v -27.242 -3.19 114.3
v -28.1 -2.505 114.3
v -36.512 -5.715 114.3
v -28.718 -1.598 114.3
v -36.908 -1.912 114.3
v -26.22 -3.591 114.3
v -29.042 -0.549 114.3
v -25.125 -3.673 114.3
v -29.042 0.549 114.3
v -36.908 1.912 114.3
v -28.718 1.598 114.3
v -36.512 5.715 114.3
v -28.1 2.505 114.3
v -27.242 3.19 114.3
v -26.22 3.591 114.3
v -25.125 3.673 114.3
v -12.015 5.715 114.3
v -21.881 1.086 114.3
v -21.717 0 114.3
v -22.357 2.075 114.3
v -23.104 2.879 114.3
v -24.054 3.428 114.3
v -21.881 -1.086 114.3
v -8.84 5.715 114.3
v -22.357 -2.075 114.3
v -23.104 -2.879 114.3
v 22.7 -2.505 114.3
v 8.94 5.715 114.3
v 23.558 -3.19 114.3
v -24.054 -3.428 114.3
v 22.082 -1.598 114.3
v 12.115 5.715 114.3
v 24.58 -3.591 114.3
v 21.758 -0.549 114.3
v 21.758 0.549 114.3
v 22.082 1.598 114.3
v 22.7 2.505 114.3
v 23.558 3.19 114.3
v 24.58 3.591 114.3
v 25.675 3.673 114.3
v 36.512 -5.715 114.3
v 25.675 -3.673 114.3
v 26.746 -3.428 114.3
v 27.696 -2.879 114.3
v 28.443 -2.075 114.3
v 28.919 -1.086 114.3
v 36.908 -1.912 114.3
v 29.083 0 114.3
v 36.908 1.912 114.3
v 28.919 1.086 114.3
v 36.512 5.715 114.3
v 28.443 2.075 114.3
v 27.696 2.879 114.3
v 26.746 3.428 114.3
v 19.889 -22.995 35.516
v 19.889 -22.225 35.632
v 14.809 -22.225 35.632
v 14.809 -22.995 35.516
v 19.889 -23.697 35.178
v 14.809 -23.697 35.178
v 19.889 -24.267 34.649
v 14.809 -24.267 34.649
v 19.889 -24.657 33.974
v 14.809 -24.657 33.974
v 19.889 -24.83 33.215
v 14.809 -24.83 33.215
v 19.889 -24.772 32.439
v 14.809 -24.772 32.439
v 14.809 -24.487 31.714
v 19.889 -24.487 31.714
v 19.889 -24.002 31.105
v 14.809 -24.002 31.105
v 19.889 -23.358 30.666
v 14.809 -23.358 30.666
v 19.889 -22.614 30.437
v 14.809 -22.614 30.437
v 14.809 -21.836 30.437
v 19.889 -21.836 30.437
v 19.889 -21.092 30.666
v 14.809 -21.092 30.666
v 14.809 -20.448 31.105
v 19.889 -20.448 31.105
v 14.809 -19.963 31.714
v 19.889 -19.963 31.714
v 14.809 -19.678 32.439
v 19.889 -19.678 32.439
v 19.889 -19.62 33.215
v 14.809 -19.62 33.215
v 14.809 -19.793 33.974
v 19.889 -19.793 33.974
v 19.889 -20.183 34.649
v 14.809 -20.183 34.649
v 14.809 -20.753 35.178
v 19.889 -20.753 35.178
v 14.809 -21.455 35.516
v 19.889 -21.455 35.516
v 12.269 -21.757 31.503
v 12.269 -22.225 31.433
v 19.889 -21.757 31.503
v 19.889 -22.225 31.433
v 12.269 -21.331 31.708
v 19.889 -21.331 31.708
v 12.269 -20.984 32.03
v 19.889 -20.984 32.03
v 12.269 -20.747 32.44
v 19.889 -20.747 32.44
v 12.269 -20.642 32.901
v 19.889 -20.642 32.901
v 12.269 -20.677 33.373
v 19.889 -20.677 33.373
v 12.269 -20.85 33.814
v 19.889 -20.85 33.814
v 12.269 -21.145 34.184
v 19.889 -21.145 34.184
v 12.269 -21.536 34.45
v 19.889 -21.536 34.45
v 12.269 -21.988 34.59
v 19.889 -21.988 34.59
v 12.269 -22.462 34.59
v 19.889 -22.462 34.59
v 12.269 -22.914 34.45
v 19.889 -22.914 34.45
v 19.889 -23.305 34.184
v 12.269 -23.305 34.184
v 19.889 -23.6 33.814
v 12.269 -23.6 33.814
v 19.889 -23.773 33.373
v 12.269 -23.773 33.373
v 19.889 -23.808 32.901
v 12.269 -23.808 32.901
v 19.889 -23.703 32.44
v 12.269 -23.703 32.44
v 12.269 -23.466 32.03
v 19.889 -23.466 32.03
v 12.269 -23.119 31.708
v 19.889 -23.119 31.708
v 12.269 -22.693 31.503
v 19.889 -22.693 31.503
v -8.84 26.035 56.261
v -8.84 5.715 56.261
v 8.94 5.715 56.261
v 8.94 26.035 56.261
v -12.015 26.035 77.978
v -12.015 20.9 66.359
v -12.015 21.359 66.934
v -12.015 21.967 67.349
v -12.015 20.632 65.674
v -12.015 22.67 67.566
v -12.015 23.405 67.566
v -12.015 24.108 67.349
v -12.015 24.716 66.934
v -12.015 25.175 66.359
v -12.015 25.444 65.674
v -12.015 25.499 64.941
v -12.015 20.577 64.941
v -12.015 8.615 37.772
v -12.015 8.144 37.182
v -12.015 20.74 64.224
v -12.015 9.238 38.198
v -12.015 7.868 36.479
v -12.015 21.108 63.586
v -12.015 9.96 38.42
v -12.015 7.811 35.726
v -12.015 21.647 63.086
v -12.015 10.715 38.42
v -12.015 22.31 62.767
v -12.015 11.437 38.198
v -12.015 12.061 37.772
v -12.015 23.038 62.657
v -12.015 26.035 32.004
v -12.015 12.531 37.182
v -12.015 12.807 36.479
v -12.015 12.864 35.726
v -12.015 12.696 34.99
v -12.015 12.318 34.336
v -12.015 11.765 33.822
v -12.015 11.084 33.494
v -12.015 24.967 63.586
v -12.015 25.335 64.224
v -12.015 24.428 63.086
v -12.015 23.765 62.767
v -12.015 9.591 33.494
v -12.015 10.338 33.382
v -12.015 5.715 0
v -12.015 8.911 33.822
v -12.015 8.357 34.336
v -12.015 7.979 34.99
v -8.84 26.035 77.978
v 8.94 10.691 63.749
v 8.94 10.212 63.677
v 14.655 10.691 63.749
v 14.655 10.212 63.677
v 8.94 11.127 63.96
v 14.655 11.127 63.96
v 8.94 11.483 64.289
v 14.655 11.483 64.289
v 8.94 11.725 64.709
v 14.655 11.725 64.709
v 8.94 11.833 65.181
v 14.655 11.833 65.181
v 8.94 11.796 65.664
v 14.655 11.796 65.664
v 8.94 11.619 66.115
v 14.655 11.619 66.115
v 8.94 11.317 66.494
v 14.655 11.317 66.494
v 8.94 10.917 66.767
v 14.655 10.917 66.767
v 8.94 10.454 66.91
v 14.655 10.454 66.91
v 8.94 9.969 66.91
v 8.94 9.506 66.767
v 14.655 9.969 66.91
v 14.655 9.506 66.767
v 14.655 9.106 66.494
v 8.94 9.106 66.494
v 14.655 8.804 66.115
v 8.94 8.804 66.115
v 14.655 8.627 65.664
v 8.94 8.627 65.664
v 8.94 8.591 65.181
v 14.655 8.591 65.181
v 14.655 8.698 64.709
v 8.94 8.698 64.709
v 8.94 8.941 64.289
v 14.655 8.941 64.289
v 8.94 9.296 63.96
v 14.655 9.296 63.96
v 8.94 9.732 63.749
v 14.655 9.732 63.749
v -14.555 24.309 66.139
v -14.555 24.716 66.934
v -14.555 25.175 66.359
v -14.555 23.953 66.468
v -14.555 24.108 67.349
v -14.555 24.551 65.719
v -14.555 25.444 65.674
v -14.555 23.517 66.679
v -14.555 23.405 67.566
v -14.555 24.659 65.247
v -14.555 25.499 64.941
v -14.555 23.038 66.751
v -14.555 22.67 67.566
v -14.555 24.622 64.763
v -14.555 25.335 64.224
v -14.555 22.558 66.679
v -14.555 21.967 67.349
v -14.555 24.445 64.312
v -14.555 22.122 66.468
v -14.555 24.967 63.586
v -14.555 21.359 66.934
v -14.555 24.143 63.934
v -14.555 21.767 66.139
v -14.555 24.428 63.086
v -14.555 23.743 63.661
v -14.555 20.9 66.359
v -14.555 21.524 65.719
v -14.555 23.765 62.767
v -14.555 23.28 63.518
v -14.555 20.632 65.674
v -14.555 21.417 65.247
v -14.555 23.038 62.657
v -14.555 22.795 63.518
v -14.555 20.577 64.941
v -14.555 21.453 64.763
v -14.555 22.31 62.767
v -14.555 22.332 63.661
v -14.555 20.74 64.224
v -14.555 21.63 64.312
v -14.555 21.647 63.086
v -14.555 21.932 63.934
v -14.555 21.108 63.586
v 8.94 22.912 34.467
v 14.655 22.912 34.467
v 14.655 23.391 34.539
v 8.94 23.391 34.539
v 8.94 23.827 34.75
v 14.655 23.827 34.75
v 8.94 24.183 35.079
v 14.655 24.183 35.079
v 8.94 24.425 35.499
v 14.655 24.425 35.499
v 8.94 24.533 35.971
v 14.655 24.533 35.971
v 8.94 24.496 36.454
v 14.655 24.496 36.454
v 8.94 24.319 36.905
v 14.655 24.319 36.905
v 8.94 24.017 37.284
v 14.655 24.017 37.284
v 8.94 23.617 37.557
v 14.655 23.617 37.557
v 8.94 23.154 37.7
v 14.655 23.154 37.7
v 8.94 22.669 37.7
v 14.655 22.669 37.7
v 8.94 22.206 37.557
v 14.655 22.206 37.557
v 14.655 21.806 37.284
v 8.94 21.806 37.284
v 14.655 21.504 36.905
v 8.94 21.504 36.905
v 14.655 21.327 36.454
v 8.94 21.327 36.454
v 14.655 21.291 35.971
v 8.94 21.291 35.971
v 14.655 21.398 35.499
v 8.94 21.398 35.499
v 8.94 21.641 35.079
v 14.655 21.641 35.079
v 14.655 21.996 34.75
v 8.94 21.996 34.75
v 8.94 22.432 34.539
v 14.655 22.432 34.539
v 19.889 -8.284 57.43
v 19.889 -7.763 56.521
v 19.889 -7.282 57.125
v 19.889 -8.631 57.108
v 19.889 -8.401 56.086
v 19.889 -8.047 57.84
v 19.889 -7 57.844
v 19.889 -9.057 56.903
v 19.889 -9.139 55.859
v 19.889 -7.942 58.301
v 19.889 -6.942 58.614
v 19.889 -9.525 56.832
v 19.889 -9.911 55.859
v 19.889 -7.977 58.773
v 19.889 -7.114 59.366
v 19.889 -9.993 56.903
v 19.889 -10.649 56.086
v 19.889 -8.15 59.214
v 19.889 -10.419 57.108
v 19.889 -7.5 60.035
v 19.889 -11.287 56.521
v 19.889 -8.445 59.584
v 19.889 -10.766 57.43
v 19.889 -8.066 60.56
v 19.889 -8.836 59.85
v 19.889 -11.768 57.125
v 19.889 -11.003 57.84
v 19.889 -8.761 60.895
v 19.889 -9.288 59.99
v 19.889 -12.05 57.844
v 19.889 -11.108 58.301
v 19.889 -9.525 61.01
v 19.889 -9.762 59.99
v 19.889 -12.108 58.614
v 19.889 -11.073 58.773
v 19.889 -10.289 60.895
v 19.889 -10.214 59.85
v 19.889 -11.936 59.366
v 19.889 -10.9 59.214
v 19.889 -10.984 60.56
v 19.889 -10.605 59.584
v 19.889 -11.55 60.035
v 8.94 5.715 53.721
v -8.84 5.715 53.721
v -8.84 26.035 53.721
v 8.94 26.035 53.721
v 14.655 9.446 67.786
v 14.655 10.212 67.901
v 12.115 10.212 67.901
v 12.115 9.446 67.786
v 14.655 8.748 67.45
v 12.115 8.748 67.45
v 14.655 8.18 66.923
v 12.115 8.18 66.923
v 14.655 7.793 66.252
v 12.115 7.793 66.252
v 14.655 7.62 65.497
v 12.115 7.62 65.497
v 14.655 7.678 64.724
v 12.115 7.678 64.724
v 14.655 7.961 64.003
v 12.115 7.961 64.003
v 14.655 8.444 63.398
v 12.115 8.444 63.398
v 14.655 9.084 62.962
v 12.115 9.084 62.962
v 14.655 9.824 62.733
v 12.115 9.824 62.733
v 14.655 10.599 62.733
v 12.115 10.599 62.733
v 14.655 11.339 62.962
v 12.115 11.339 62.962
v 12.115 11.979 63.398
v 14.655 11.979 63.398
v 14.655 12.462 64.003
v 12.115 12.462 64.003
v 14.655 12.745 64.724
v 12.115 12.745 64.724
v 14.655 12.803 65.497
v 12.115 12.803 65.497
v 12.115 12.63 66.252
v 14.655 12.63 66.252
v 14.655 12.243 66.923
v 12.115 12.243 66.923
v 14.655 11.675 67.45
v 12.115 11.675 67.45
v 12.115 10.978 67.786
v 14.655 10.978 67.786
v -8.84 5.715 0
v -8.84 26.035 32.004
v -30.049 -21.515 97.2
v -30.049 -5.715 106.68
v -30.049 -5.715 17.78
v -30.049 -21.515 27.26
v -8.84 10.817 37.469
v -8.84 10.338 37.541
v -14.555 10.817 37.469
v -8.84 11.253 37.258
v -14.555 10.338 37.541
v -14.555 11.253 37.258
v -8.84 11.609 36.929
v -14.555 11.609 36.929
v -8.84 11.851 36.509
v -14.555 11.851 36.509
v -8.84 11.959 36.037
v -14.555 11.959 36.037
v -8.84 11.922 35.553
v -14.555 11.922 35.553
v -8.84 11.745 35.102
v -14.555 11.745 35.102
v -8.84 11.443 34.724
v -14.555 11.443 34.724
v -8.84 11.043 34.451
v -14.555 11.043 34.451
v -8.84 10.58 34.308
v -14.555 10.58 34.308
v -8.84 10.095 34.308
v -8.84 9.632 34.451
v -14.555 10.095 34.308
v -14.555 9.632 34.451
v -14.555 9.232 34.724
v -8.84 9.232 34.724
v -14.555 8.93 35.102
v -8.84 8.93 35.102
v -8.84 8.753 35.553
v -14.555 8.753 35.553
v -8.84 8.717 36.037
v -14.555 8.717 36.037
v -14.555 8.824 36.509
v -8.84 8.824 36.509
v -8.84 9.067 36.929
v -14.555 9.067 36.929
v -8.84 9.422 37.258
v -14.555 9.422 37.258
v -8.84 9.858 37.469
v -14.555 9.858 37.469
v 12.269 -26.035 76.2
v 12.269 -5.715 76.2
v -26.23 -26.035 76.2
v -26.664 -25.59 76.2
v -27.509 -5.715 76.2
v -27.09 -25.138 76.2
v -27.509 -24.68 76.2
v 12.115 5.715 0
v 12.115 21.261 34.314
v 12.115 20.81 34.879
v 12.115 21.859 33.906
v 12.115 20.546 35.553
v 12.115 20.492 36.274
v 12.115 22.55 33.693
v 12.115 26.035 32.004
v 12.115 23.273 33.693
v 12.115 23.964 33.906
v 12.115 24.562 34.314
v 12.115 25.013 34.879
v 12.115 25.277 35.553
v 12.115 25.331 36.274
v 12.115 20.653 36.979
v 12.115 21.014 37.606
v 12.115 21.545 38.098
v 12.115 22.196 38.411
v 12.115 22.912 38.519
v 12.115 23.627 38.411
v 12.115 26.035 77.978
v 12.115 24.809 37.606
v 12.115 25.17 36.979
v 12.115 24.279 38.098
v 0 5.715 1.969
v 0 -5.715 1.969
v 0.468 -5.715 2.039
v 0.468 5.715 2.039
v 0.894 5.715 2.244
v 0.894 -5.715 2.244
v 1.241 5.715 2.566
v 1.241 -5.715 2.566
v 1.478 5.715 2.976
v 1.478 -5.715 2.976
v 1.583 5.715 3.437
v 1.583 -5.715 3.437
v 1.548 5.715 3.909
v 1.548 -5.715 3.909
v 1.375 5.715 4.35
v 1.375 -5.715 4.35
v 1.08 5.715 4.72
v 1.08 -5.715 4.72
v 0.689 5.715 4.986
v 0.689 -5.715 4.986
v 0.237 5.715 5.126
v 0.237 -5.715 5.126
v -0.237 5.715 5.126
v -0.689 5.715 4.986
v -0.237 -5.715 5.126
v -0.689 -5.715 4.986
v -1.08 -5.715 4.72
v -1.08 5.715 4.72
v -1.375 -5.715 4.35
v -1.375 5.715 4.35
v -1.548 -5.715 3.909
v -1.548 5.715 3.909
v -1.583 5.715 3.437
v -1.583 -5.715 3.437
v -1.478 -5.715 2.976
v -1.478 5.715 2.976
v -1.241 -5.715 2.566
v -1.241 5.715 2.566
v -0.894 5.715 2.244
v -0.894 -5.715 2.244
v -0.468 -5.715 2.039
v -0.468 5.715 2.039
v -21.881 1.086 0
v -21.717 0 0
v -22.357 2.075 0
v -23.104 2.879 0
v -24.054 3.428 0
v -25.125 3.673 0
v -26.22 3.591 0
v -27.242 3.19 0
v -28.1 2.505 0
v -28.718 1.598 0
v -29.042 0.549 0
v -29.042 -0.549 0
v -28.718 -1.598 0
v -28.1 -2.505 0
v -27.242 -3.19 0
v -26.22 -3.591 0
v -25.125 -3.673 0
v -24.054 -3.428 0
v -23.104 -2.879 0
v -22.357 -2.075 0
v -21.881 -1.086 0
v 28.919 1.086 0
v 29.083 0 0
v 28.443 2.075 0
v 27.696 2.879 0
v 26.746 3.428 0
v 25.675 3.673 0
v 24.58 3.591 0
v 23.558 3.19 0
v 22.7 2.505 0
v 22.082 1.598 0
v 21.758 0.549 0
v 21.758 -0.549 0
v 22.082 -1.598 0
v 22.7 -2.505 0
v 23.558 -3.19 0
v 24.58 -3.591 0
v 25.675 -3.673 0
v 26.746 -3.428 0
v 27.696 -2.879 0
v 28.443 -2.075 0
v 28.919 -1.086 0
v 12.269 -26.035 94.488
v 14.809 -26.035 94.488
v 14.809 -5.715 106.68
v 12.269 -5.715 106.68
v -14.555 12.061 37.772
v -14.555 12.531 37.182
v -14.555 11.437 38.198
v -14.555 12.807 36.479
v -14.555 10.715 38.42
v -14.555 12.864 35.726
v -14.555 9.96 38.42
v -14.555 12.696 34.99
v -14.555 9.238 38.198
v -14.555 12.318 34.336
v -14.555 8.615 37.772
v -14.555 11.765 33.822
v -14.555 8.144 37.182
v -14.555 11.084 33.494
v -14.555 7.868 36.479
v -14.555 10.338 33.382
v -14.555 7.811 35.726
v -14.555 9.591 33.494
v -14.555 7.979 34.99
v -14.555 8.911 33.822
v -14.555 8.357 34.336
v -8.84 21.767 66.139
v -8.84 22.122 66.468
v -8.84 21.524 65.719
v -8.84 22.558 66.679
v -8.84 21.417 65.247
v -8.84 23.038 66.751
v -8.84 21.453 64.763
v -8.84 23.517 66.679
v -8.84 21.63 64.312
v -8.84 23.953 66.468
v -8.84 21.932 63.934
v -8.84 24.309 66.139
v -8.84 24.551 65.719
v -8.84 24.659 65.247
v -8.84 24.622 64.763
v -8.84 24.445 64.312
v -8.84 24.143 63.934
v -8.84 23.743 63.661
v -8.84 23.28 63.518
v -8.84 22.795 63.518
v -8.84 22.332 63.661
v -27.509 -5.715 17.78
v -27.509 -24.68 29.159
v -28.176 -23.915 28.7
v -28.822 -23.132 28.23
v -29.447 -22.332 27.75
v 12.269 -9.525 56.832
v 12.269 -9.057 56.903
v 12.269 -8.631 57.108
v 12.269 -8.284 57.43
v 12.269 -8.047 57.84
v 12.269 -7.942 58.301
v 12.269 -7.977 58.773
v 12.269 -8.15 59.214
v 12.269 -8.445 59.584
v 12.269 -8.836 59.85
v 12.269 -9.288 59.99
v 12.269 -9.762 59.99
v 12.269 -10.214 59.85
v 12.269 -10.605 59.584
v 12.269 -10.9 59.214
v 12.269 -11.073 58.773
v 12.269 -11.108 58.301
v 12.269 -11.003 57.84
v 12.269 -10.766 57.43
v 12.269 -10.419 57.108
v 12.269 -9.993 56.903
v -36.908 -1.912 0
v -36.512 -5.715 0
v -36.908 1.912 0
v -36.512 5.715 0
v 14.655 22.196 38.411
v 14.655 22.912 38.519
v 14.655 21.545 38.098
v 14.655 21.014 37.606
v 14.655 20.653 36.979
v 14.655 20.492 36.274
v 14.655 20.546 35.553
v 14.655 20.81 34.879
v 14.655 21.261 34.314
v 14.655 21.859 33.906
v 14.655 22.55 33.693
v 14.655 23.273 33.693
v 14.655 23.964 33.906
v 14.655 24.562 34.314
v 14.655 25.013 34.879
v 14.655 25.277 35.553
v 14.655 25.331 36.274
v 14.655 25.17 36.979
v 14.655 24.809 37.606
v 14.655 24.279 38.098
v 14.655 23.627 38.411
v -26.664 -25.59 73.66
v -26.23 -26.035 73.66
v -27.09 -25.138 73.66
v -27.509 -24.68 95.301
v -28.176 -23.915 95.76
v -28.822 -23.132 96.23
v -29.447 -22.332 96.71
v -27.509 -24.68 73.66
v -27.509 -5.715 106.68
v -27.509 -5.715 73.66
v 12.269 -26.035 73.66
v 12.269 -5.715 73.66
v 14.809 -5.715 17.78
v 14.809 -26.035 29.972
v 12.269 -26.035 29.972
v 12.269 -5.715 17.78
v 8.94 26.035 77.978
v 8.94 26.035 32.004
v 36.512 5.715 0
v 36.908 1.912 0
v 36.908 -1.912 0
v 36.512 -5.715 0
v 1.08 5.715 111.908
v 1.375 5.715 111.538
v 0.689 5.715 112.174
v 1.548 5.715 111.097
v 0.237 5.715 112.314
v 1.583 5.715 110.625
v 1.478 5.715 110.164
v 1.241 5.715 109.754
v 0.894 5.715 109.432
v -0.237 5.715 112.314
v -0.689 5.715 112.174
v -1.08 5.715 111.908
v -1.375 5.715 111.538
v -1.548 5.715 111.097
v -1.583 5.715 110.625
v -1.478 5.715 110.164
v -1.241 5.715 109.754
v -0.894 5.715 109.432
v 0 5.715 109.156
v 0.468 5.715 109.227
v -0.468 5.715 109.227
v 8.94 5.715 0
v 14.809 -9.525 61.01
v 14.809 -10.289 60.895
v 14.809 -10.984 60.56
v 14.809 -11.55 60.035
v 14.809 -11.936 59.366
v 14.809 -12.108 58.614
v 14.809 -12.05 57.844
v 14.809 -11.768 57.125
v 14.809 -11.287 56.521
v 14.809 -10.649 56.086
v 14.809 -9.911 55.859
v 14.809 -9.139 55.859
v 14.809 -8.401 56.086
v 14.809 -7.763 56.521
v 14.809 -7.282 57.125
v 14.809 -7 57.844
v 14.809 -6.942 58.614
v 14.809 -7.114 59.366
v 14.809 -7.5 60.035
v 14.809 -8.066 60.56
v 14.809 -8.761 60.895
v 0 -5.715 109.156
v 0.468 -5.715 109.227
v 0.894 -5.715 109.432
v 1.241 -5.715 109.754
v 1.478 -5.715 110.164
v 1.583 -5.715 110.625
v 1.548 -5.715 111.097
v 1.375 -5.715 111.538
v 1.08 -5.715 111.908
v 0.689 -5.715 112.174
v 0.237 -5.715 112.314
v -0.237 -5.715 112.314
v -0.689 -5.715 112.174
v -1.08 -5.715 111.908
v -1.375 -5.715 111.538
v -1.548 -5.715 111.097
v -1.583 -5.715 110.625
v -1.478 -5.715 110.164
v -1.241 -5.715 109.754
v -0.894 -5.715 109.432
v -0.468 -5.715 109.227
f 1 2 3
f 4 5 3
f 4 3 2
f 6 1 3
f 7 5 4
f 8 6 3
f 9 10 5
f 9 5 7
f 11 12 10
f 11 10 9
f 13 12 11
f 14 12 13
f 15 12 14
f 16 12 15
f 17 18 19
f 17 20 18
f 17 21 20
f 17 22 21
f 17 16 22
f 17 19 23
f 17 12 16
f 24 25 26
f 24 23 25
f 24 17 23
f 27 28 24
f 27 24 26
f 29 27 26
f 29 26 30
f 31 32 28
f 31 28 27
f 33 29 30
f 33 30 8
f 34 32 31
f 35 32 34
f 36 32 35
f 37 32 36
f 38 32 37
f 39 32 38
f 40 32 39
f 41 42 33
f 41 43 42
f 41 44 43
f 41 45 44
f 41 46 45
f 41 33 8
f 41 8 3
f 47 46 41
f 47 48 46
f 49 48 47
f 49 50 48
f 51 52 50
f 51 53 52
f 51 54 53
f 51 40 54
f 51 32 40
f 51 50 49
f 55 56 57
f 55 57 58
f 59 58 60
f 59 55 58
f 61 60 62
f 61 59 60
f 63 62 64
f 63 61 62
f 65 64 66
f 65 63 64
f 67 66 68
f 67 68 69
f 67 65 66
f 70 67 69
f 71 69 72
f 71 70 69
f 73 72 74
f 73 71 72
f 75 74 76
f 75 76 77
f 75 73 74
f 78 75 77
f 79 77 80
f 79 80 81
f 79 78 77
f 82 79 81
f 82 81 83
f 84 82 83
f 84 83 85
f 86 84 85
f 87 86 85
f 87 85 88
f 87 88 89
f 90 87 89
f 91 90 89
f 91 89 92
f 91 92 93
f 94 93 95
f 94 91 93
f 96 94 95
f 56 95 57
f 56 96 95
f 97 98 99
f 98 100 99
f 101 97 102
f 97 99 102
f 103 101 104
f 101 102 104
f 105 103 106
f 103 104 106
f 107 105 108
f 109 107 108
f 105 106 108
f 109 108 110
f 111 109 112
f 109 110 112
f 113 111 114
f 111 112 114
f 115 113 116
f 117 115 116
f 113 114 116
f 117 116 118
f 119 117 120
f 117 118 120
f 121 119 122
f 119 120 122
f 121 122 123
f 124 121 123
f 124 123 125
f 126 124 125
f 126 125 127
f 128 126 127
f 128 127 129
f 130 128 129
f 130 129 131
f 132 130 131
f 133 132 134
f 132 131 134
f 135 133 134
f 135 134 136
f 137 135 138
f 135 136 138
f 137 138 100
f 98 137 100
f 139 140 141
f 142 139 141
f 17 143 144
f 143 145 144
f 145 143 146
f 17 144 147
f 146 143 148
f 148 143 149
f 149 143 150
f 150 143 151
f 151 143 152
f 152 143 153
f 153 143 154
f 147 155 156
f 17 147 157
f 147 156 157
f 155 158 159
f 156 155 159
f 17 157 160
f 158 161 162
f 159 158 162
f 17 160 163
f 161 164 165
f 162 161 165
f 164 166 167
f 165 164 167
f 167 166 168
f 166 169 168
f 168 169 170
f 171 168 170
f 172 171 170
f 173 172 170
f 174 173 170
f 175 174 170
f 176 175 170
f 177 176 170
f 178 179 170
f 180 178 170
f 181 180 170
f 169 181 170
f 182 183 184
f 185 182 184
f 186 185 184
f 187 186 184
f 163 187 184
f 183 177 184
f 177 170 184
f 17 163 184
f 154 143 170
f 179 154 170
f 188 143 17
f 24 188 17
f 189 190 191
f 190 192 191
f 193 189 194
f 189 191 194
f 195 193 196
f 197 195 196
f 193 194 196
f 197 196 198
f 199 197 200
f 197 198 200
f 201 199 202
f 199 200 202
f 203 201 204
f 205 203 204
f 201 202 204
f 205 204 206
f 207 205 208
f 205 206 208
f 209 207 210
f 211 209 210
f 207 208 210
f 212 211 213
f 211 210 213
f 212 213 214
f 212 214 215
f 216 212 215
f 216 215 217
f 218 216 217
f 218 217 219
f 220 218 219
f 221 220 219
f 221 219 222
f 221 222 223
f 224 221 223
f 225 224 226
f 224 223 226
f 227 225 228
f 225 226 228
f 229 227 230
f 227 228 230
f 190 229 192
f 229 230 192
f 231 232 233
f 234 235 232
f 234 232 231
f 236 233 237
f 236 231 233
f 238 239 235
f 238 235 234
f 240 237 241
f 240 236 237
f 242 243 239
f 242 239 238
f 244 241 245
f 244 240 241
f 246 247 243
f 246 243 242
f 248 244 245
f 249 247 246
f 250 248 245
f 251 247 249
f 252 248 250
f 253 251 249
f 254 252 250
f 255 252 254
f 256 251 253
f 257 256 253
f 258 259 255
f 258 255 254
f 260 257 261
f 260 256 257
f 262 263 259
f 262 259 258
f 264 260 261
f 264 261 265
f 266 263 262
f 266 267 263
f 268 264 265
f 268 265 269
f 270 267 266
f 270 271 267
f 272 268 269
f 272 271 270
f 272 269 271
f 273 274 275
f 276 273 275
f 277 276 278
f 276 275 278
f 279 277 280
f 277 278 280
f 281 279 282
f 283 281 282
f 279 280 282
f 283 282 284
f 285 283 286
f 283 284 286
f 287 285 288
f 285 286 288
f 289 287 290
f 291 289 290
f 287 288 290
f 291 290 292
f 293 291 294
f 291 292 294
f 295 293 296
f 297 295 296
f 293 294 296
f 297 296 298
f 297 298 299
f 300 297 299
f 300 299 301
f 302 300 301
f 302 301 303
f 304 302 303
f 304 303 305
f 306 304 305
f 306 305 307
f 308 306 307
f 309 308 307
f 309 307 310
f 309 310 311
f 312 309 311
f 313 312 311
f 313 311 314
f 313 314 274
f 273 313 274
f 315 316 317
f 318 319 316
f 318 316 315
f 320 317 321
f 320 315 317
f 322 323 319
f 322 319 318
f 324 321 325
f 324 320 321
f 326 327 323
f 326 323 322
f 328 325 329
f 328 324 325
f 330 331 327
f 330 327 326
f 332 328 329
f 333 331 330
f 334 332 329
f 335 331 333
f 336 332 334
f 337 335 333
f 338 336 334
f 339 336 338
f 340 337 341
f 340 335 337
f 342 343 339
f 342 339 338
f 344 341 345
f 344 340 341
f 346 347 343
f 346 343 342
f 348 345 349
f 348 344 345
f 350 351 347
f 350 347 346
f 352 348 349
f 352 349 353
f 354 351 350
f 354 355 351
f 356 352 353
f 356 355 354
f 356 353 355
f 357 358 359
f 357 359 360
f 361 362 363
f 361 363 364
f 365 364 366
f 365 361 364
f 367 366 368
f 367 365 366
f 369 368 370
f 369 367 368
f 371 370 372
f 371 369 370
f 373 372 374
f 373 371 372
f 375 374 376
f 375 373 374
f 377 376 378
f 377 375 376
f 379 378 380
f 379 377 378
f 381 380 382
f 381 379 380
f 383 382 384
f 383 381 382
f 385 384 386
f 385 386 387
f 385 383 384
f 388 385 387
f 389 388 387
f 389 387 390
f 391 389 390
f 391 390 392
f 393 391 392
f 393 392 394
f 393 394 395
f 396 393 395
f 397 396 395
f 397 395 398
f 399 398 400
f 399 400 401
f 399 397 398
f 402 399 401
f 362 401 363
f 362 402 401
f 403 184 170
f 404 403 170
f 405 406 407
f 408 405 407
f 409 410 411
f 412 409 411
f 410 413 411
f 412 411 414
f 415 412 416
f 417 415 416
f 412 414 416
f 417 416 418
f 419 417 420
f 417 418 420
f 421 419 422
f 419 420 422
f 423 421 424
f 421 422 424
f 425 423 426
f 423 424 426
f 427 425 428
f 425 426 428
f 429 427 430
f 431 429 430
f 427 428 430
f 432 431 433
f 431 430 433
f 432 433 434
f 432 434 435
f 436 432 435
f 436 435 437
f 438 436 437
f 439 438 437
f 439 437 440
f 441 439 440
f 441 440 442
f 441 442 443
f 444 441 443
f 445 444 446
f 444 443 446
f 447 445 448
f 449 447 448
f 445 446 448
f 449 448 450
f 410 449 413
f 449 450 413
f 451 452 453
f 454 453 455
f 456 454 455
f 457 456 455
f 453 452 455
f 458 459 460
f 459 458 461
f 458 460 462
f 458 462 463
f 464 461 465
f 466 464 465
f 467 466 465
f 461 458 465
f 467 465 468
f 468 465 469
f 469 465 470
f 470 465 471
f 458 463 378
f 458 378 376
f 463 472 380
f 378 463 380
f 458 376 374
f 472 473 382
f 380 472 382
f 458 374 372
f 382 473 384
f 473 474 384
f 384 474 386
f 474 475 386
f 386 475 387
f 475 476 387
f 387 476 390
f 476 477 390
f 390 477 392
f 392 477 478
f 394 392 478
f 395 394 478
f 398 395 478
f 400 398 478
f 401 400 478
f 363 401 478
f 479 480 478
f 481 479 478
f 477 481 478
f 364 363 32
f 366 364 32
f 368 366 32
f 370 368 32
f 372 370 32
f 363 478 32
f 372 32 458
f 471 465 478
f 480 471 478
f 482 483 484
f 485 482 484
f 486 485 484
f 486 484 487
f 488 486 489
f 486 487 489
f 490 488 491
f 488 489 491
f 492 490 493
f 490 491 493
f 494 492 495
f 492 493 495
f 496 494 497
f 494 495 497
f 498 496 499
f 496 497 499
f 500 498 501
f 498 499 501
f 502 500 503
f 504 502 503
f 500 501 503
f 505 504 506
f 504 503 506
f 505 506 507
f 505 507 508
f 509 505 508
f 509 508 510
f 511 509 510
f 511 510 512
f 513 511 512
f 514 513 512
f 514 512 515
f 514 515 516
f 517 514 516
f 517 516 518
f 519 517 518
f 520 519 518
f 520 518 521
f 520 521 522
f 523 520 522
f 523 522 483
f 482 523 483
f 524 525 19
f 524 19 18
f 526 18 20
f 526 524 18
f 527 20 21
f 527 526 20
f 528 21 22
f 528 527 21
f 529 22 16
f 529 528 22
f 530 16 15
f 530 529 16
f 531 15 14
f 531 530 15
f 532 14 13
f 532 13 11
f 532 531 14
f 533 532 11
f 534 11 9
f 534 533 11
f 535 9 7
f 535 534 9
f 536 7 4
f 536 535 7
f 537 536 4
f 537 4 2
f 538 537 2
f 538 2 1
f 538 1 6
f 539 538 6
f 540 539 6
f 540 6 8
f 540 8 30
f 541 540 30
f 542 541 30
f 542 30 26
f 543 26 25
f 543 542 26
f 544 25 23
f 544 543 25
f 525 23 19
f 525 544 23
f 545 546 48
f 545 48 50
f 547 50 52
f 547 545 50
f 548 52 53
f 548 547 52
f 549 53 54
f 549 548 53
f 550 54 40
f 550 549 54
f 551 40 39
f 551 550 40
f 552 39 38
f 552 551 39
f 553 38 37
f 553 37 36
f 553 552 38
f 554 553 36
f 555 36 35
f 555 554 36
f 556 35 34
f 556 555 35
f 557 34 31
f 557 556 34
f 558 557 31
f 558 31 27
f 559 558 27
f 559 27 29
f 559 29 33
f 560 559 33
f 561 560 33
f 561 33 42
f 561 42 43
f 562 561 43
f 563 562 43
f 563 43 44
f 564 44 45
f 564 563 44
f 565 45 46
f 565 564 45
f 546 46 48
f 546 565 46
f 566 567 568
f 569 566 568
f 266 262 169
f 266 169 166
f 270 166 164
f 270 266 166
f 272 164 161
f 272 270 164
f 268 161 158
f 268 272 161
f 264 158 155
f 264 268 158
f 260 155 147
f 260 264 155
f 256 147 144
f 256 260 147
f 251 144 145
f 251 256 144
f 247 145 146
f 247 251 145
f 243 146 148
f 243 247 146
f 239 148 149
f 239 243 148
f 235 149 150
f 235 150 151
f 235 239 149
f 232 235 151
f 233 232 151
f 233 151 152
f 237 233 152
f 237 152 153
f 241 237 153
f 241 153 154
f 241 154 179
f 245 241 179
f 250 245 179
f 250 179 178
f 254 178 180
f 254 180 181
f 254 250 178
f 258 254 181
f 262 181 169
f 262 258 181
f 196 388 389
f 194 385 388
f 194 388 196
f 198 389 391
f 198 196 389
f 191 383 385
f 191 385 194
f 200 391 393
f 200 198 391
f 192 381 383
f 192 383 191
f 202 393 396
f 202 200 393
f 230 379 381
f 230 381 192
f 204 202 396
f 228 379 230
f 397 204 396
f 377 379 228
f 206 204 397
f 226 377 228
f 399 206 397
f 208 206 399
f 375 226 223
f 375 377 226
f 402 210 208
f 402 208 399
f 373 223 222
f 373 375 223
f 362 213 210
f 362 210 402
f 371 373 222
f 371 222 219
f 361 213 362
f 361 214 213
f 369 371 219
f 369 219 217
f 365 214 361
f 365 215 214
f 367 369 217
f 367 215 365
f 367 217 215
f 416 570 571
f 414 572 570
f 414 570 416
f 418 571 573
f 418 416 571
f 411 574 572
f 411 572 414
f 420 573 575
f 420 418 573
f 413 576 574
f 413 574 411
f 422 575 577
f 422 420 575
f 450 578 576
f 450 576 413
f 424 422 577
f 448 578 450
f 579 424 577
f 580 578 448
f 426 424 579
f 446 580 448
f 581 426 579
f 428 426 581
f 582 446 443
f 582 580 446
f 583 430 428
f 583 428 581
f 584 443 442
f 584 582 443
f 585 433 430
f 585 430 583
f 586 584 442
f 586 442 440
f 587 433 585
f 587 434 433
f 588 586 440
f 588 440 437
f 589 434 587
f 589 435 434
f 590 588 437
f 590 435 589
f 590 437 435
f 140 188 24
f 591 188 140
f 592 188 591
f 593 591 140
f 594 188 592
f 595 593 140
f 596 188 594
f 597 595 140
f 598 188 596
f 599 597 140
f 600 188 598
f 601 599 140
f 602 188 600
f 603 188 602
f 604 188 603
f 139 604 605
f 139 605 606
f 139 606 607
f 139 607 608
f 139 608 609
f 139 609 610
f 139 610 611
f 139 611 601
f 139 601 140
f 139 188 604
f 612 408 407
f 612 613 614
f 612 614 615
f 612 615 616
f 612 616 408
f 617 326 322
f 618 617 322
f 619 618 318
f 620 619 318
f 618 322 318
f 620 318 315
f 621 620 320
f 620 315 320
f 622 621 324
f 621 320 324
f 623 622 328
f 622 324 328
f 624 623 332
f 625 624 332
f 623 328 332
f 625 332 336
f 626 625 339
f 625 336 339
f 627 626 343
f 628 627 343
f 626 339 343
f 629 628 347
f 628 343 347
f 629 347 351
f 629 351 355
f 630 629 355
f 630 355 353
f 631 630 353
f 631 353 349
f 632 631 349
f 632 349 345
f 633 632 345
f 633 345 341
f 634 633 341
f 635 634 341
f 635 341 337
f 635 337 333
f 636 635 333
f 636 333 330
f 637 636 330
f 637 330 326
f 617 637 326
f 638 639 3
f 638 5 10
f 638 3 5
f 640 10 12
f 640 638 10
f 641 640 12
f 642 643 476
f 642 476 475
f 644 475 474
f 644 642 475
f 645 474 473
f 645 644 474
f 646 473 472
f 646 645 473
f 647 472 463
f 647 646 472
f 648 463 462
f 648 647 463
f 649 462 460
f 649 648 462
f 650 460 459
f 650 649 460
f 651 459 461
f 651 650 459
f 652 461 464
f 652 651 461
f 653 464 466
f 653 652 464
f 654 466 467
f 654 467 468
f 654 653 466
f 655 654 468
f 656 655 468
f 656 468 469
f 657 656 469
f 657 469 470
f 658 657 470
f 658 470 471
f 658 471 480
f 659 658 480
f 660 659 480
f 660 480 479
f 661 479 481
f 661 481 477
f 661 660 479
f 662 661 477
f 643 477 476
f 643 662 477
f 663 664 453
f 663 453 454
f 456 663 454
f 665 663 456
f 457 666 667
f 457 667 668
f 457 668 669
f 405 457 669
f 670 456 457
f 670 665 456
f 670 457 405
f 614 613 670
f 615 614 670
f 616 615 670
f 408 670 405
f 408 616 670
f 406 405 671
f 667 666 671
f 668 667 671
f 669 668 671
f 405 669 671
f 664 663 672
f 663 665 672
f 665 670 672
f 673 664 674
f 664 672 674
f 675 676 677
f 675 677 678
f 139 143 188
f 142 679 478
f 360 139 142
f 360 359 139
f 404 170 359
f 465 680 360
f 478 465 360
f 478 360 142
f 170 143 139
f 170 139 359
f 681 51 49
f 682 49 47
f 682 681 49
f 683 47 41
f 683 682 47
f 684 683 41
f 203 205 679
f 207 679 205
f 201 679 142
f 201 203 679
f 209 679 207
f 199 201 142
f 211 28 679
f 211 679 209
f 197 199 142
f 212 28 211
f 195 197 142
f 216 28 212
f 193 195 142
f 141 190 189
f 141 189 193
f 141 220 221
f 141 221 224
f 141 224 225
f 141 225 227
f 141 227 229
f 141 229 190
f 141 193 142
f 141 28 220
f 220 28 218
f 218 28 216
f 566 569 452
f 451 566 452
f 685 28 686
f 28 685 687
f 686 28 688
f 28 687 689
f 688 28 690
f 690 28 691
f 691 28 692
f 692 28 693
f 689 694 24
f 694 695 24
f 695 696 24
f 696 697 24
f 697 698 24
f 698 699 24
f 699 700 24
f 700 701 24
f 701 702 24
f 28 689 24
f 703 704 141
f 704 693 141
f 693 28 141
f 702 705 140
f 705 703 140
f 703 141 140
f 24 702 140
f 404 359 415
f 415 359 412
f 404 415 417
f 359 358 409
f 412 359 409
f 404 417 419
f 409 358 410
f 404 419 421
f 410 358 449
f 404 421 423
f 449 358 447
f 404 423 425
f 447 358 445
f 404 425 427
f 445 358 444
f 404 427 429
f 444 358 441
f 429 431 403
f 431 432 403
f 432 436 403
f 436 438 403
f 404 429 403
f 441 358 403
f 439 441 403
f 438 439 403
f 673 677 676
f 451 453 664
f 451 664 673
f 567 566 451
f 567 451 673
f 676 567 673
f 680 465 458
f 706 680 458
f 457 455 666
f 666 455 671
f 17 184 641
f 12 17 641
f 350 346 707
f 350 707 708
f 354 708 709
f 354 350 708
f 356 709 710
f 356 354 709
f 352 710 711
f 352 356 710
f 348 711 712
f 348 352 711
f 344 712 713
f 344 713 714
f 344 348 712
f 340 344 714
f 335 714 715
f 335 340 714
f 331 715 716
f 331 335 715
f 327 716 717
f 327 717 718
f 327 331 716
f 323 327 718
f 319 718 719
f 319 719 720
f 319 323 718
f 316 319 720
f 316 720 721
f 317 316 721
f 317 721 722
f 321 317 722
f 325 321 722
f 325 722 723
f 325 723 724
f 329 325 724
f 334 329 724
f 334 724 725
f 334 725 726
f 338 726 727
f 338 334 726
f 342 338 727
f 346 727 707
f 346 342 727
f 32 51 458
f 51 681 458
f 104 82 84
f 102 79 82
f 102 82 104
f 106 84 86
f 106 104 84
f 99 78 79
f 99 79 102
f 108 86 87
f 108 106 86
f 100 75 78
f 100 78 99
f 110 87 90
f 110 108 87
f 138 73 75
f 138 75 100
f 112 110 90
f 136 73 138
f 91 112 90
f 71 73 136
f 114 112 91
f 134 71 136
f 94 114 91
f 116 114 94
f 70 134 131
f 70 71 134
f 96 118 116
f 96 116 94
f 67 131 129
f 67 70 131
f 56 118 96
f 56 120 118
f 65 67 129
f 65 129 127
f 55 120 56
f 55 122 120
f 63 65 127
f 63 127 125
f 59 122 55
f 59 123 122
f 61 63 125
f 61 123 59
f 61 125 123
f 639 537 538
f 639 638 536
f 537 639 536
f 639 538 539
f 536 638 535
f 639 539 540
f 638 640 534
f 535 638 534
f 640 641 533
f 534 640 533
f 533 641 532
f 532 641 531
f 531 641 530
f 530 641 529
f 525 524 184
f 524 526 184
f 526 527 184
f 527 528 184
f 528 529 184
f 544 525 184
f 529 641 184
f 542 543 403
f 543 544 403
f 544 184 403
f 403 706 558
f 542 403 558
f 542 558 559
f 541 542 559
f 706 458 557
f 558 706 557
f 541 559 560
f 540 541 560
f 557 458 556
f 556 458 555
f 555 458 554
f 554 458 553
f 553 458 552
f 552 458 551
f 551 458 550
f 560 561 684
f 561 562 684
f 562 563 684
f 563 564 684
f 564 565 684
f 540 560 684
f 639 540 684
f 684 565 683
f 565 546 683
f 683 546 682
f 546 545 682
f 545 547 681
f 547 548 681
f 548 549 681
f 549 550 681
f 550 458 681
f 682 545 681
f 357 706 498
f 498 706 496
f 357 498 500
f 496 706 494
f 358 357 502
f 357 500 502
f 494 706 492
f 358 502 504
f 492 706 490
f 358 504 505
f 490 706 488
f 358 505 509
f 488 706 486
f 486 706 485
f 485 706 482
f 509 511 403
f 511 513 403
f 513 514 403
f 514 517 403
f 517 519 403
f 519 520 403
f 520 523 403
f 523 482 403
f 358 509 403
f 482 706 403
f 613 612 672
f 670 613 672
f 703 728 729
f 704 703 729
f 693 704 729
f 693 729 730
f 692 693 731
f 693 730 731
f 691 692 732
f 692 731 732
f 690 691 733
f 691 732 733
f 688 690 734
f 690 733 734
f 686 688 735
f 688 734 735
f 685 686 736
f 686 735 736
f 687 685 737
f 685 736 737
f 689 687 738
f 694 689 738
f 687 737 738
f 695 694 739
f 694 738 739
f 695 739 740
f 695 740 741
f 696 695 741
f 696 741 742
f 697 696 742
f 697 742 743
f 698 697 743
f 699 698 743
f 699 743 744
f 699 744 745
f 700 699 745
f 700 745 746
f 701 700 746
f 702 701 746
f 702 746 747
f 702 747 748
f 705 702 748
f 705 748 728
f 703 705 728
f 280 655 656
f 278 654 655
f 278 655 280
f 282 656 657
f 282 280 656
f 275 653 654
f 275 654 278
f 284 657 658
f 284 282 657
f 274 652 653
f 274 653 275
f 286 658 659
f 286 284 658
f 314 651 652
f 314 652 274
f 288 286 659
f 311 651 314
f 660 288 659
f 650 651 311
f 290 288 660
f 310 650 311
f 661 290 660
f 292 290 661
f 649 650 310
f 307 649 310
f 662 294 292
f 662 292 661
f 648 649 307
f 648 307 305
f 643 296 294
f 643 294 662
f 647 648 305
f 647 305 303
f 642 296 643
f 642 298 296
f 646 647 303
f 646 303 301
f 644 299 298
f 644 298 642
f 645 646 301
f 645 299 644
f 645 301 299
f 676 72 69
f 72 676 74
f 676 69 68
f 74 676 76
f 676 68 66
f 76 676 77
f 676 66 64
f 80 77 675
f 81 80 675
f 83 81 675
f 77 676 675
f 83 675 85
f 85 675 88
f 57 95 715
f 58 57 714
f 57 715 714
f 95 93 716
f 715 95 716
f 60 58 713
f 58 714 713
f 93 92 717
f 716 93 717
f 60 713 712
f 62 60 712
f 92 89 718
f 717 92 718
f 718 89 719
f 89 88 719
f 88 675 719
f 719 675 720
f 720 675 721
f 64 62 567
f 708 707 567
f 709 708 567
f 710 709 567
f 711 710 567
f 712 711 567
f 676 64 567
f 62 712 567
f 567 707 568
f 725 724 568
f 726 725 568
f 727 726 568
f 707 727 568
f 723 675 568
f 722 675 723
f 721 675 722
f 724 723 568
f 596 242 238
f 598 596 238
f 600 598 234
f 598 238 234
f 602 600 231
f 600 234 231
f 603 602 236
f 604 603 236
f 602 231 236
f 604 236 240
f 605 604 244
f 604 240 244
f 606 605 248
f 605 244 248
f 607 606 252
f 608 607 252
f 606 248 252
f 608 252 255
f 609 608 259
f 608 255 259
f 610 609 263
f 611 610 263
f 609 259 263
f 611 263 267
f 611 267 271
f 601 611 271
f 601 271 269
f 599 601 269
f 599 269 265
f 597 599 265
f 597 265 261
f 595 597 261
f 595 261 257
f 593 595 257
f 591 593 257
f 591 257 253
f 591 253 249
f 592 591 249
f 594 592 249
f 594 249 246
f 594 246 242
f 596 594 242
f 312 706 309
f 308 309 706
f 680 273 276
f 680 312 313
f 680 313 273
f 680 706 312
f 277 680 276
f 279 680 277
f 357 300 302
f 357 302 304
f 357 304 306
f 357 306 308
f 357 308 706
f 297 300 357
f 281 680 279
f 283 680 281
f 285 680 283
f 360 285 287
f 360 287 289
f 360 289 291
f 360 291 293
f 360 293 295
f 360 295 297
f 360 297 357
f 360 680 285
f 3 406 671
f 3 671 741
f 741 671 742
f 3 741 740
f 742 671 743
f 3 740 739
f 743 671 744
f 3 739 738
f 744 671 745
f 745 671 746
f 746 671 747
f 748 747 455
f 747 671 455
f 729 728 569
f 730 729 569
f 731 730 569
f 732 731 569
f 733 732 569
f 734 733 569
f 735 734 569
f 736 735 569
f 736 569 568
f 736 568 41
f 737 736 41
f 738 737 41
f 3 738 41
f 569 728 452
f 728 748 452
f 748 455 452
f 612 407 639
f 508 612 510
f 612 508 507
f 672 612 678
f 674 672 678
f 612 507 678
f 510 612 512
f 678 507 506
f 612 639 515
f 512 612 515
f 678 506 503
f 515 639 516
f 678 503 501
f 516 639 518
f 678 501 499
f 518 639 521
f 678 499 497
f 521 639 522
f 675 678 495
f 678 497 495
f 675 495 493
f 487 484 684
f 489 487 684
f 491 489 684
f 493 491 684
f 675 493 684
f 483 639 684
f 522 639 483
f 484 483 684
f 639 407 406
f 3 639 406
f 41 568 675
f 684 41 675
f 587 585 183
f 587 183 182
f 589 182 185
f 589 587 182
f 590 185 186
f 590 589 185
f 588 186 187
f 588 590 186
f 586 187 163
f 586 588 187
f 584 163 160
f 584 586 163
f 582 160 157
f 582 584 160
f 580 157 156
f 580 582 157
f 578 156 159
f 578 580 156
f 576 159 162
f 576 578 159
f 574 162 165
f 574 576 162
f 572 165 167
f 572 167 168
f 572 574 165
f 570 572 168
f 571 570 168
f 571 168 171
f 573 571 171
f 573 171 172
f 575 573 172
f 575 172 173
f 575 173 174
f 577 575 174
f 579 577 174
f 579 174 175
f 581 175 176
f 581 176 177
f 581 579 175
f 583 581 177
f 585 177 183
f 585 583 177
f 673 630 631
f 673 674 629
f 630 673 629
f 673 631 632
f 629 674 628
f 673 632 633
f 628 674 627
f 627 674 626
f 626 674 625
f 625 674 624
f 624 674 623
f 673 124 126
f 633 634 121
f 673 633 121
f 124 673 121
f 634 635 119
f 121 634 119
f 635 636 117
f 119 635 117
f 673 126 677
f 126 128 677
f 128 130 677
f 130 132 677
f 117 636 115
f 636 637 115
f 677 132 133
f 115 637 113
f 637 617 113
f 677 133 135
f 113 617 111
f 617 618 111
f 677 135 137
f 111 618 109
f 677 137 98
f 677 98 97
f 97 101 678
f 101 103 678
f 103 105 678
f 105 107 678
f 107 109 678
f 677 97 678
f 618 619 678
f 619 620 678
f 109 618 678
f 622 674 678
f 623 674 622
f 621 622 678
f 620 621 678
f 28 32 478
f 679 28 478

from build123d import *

# Parameters (mm, degrees)
SKETCH1_R            = 5.715
SKETCH1_R_2          = 3.683
BOSS_EXTRUDE2_DEPTH  = 114.3
SKETCH2_W            = 3.175
SKETCH2_H            = 45.974
BOSS_EXTRUDE3_DEPTH  = 20.32
SKETCH8_W            = 17.78
SKETCH8_H            = 2.54
BOSS_EXTRUDE6_DEPTH  = 20.32
BOSS_EXTRUDE9_DEPTH  = 20.32
CUT_EXTRUDE5_REACH   = 130.614
SKETCH10_R           = 1.5875
CUT_EXTRUDE6_REACH   = 126.596
SKETCH13_R           = 1.5875
BOSS_EXTRUDE14_DEPTH = 3.175
BOSS_EXTRUDE15_DEPTH = 3.175
BOSS_EXTRUDE16_START = 5.08
SKETCH12_R           = 2.590347575
SKETCH12_R_2         = 1.5875
SKETCH12_R_3         = 2.612210891
BOSS_EXTRUDE16_DEPTH = 5.08
CHAMFER1_SIZE        = 2.54
SKETCH21_R           = 1.6256
CUT_EXTRUDE7_DEPTH   = 5.08
SKETCH22_R           = 1.6256
CUT_EXTRUDE8_DEPTH   = 5.08
BOSS_EXTRUDE17_START = 2.54
SKETCH23_R           = 2.426614549
SKETCH23_R_2         = 1.6256
SKETCH23_R_3         = 2.598483989
BOSS_EXTRUDE17_DEPTH = 2.54
BOSS_EXTRUDE18_START = 2.54
SKETCH24_R           = 2.467964506
SKETCH24_R_2         = 1.6256
SKETCH24_R_3         = 2.533270714
BOSS_EXTRUDE18_DEPTH = 2.54
SKETCH25_R           = 48.771557558
SKETCH25_R_2         = 36.957
CUT_EXTRUDE9_DEPTH   = 124.263624906
CUT_EXTRUDE10_DEPTH  = 129.148442846


with BuildPart() as part:
    # Sketch1 → Boss-Extrude2 (new body)
    # profile 1 of 8: a face of its own
    with BuildSketch(Plane.XY):
        with BuildLine():
            Line((25.4, 5.715), (-25.4, 5.715))
            ThreePointArc((-25.4, 5.715), (-21.358884746, 4.041115254), (-19.685, 0))
            Line((-19.685, 0), (19.685, 0))
            ThreePointArc((19.685, 0), (21.358884746, 4.041115254), (25.4, 5.715))
        make_face()
    # profile 2 of 8: a face of its own
    with BuildSketch(Plane.XY):
        with Locations((-25.4, 0)):
            Circle(SKETCH1_R)
        with Locations((-25.4, 0)):
            Circle(SKETCH1_R_2, mode=Mode.SUBTRACT)
    # profile 3 of 8: a face of its own
    with BuildSketch(Plane.XY):
        with Locations((25.4, 0)):
            Circle(SKETCH1_R)
        with Locations((25.4, 0)):
            Circle(SKETCH1_R_2, mode=Mode.SUBTRACT)
    # profile 4 of 8: a face of its own
    with BuildSketch(Plane.XY):
        with BuildLine():
            ThreePointArc((-31.115, 0), (-29.441115254, 4.041115254), (-25.4, 5.715))
            Line((-25.4, 5.715), (-37.668936473, 5.715))
            ThreePointArc((-37.668936473, 5.715), (-37.992081278, 2.865616895), (-38.1, 0))
            Line((-38.1, 0), (-31.115, 0))
        make_face()
    # profile 5 of 8: a face of its own
    with BuildSketch(Plane.XY):
        with BuildLine():
            Line((37.668936473, 5.715), (25.4, 5.715))
            ThreePointArc((25.4, 5.715), (29.441115254, 4.041115254), (31.115, 0))
            Line((31.115, 0), (38.1, 0))
            ThreePointArc((38.1, 0), (37.992081278, 2.865616895), (37.668936473, 5.715))
        make_face()
    # profile 6 of 8: a face of its own
    with BuildSketch(Plane.XY):
        with BuildLine():
            Line((38.1, 0), (31.115, 0))
            ThreePointArc((31.115, 0), (29.441115254, -4.041115254), (25.4, -5.715))
            Line((25.4, -5.715), (37.668936473, -5.715))
            ThreePointArc((37.668936473, -5.715), (37.992081278, -2.865616895), (38.1, 0))
        make_face()
    # profile 7 of 8: a face of its own
    with BuildSketch(Plane.XY):
        with BuildLine():
            Line((19.685, 0), (-19.685, 0))
            ThreePointArc((-19.685, 0), (-21.358884746, -4.041115254), (-25.4, -5.715))
            Line((-25.4, -5.715), (25.4, -5.715))
            ThreePointArc((25.4, -5.715), (21.358884746, -4.041115254), (19.685, 0))
        make_face()
    # profile 8 of 8: a face of its own
    with BuildSketch(Plane.XY):
        with BuildLine():
            ThreePointArc((-25.4, -5.715), (-29.441115254, -4.041115254), (-31.115, 0))
            Line((-31.115, 0), (-38.1, 0))
            ThreePointArc((-38.1, 0), (-37.992081278, -2.865616895), (-37.668936473, -5.715))
            Line((-37.668936473, -5.715), (-25.4, -5.715))
        make_face()
    extrude(amount=BOSS_EXTRUDE2_DEPTH)

    # Sketch2 → Boss-Extrude3 (add)
    with BuildSketch(Plane(origin=(0, 5.715, 0), x_dir=(1, 0, 0), z_dir=(0, 1, 0))):
        with Locations((-10.427436473, -54.991)):
            Rectangle(SKETCH2_W, SKETCH2_H)
        with Locations((10.527563527, -54.991)):
            Rectangle(SKETCH2_W, SKETCH2_H)
    extrude(amount=BOSS_EXTRUDE3_DEPTH)

    # Sketch8 → Boss-Extrude6 (add)
    with BuildSketch(Plane(origin=(0, 5.715, 0), x_dir=(1, 0, 0), z_dir=(0, 1, 0))):
        with Locations((0.050063527, -54.991)):
            Rectangle(SKETCH8_W, SKETCH8_H)
    extrude(amount=BOSS_EXTRUDE6_DEPTH)

    # Sketch9 → Boss-Extrude9 (add)
    with BuildSketch(Plane.XZ.offset(5.715)):
        Polygon((12.268936473, 73.66), (12.268936473, 17.78), (14.808936473, 17.78), (14.808936473, 106.68), (12.268936473, 106.68), (12.268936473, 76.2), (-27.508936473, 76.2), (-27.508936473, 106.68), (-30.048936473, 106.68), (-30.048936473, 17.78), (-27.508936473, 17.78), (-27.508936473, 73.66), align=None)
    extrude(amount=BOSS_EXTRUDE9_DEPTH)

    # Sketch10 → Cut-Extrude5 (cut, up to next)
    with BuildSketch(Plane(origin=(14.808936473, 0, 0), x_dir=(0, 0, -1), z_dir=(1, 0, 0)), mode=Mode.PRIVATE) as cut_extrude5_sk1:
        with Locations((-58.42, -9.525)):
            Circle(SKETCH10_R)
    cut_extrude5_tool1 = extrude(cut_extrude5_sk1.sketch, amount=-CUT_EXTRUDE5_REACH, mode=Mode.PRIVATE) & part.part
    # Sketch10 → Cut-Extrude5 (cut, up to next)
    with BuildSketch(Plane(origin=(14.808936473, 0, 0), x_dir=(0, 0, -1), z_dir=(1, 0, 0)), mode=Mode.PRIVATE) as cut_extrude5_sk2:
        with Locations((-33.02, -22.225)):
            Circle(SKETCH10_R)
    cut_extrude5_tool2 = extrude(cut_extrude5_sk2.sketch, amount=-CUT_EXTRUDE5_REACH, mode=Mode.PRIVATE) & part.part
    add(cut_extrude5_tool1.solids().sort_by_distance((14.808936, -9.525, 58.42))[0], mode=Mode.SUBTRACT)
    add(cut_extrude5_tool2.solids().sort_by_distance((14.808936, -22.225, 33.02))[0], mode=Mode.SUBTRACT)

    # Sketch13 → Cut-Extrude6 (cut, up to next)
    with BuildSketch(Plane.XZ.offset(5.715), mode=Mode.PRIVATE) as cut_extrude6_sk1:
        with Locations(Location((0, 110.744, 0), (0, 0, 270))):
            Circle(SKETCH13_R)
    cut_extrude6_tool1 = extrude(cut_extrude6_sk1.sketch, amount=-CUT_EXTRUDE6_REACH, mode=Mode.PRIVATE) & part.part
    # Sketch13 → Cut-Extrude6 (cut, up to next)
    with BuildSketch(Plane.XZ.offset(5.715), mode=Mode.PRIVATE) as cut_extrude6_sk2:
        with Locations(Location((0, 3.556, 0), (0, 0, 270))):
            Circle(SKETCH13_R)
    cut_extrude6_tool2 = extrude(cut_extrude6_sk2.sketch, amount=-CUT_EXTRUDE6_REACH, mode=Mode.PRIVATE) & part.part
    add(cut_extrude6_tool1.solids().sort_by_distance((0, -5.715, 110.744))[0], mode=Mode.SUBTRACT)
    add(cut_extrude6_tool2.solids().sort_by_distance((0, -5.715, 3.556))[0], mode=Mode.SUBTRACT)

    # Sketch18 → Boss-Extrude14 (add)
    with BuildSketch(Plane.ZY.offset(12.014936473)):
        Polygon((77.978, 5.715), (77.978, 26.035), (114.3, 5.715), align=None)
        Polygon((32.004, 26.035), (32.004, 5.715), (0, 5.715), align=None)
    extrude(amount=-BOSS_EXTRUDE14_DEPTH)

    # Sketch19 → Boss-Extrude15 (add)
    with BuildSketch(Plane(origin=(12.115063527, 0, 0), x_dir=(0, 0, -1), z_dir=(1, 0, 0))):
        Polygon((-32.004, 26.035), (0, 5.715), (-32.004, 5.715), align=None)
        Polygon((-77.978, 5.715), (-114.3, 5.715), (-77.978, 26.035), align=None)
    extrude(amount=-BOSS_EXTRUDE15_DEPTH)

    # Sketch12 → Boss-Extrude16 (add)
    # profile 1 of 2: a face of its own
    with BuildSketch(Plane(origin=(14.808936473, 0, 0), x_dir=(0, 0, -1), z_dir=(1, 0, 0)).offset(BOSS_EXTRUDE16_START)):
        with Locations(Location((-58.42, -9.525, 0), (0, 0, 180))):
            Circle(SKETCH12_R)
        with Locations((-58.42, -9.525)):
            Circle(SKETCH12_R_2, mode=Mode.SUBTRACT)
    # profile 2 of 2: a face of its own
    with BuildSketch(Plane(origin=(14.808936473, 0, 0), x_dir=(0, 0, -1), z_dir=(1, 0, 0)).offset(BOSS_EXTRUDE16_START)):
        with Locations(Location((-33.02, -22.225, 0), (0, 0, 180))):
            Circle(SKETCH12_R_3)
        with Locations((-33.02, -22.225)):
            Circle(SKETCH12_R_2, mode=Mode.SUBTRACT)
    extrude(amount=-BOSS_EXTRUDE16_DEPTH)

    # Chamfer1
    chamfer1_edges = [part.edges().sort_by_distance(p)[0] for p in [
        (-30.048936473, -26.035, 62.23),
    ]]
    chamfer(chamfer1_edges, length=CHAMFER1_SIZE)

    # Sketch21 → Cut-Extrude7 (cut)
    with BuildSketch(Plane.ZY.offset(12.014936473)):
        with Locations((65.125187458, 23.037602192)):
            Circle(SKETCH21_R)
        with Locations((35.915187458, 10.337602192)):
            Circle(SKETCH21_R)
    extrude(amount=-CUT_EXTRUDE7_DEPTH, mode=Mode.SUBTRACT)

    # Sketch22 → Cut-Extrude8 (cut)
    with BuildSketch(Plane(origin=(12.115063527, 0, 0), x_dir=(0, 0, -1), z_dir=(1, 0, 0))):
        with Locations((-36.092684175, 22.91159358)):
            Circle(SKETCH22_R)
        with Locations((-65.302684175, 10.21159358)):
            Circle(SKETCH22_R)
    extrude(amount=-CUT_EXTRUDE8_DEPTH, mode=Mode.SUBTRACT)

    # Sketch23 → Boss-Extrude17 (add)
    # profile 1 of 2: a face of its own
    with BuildSketch(Plane(origin=(12.115063527, 0, 0), x_dir=(0, 0, -1), z_dir=(1, 0, 0)).offset(BOSS_EXTRUDE17_START)):
        with Locations(Location((-36.092684175, 22.91159358, 0), (0, 0, 180))):
            Circle(SKETCH23_R)
        with Locations((-36.092684175, 22.91159358)):
            Circle(SKETCH23_R_2, mode=Mode.SUBTRACT)
    # profile 2 of 2: a face of its own
    with BuildSketch(Plane(origin=(12.115063527, 0, 0), x_dir=(0, 0, -1), z_dir=(1, 0, 0)).offset(BOSS_EXTRUDE17_START)):
        with Locations(Location((-65.302684175, 10.21159358, 0), (0, 0, 180))):
            Circle(SKETCH23_R_3)
        with Locations((-65.302684175, 10.21159358)):
            Circle(SKETCH23_R_2, mode=Mode.SUBTRACT)
    extrude(amount=-BOSS_EXTRUDE17_DEPTH)

    # Sketch24 → Boss-Extrude18 (add)
    # profile 1 of 2: a face of its own
    with BuildSketch(Plane.ZY.offset(12.014936473).offset(BOSS_EXTRUDE18_START)):
        with Locations(Location((65.125187458, 23.037602192, 0), (0, 0, 180))):
            Circle(SKETCH24_R)
        with Locations((65.125187458, 23.037602192)):
            Circle(SKETCH24_R_2, mode=Mode.SUBTRACT)
    # profile 2 of 2: a face of its own
    with BuildSketch(Plane.ZY.offset(12.014936473).offset(BOSS_EXTRUDE18_START)):
        with Locations(Location((35.915187458, 10.337602192, 0), (0, 0, 180))):
            Circle(SKETCH24_R_3)
        with Locations((35.915187458, 10.337602192)):
            Circle(SKETCH24_R_2, mode=Mode.SUBTRACT)
    extrude(amount=-BOSS_EXTRUDE18_DEPTH)

    # Sketch25 → Cut-Extrude9 (cut, through all)
    with BuildSketch(Plane(origin=(0, 0, 0), x_dir=(-1, 0, 0), z_dir=(0, 0, -1))):
        Circle(SKETCH25_R)
        Circle(SKETCH25_R_2, mode=Mode.SUBTRACT)
    extrude(amount=-CUT_EXTRUDE9_DEPTH, mode=Mode.SUBTRACT)

    # Sketch26 → Cut-Extrude10 (cut, through all)
    with BuildSketch(Plane(origin=(14.808936473, 0, 0), x_dir=(0, 0, -1), z_dir=(1, 0, 0))):
        Polygon((-29.972, -26.035), (-17.78, -5.715), (-17.78, -26.035), align=None)
        Polygon((-106.68, -5.715), (-106.68, -26.035), (-94.488, -26.035), align=None)
    extrude(amount=-CUT_EXTRUDE10_DEPTH, mode=Mode.SUBTRACT)


solid = part.part
